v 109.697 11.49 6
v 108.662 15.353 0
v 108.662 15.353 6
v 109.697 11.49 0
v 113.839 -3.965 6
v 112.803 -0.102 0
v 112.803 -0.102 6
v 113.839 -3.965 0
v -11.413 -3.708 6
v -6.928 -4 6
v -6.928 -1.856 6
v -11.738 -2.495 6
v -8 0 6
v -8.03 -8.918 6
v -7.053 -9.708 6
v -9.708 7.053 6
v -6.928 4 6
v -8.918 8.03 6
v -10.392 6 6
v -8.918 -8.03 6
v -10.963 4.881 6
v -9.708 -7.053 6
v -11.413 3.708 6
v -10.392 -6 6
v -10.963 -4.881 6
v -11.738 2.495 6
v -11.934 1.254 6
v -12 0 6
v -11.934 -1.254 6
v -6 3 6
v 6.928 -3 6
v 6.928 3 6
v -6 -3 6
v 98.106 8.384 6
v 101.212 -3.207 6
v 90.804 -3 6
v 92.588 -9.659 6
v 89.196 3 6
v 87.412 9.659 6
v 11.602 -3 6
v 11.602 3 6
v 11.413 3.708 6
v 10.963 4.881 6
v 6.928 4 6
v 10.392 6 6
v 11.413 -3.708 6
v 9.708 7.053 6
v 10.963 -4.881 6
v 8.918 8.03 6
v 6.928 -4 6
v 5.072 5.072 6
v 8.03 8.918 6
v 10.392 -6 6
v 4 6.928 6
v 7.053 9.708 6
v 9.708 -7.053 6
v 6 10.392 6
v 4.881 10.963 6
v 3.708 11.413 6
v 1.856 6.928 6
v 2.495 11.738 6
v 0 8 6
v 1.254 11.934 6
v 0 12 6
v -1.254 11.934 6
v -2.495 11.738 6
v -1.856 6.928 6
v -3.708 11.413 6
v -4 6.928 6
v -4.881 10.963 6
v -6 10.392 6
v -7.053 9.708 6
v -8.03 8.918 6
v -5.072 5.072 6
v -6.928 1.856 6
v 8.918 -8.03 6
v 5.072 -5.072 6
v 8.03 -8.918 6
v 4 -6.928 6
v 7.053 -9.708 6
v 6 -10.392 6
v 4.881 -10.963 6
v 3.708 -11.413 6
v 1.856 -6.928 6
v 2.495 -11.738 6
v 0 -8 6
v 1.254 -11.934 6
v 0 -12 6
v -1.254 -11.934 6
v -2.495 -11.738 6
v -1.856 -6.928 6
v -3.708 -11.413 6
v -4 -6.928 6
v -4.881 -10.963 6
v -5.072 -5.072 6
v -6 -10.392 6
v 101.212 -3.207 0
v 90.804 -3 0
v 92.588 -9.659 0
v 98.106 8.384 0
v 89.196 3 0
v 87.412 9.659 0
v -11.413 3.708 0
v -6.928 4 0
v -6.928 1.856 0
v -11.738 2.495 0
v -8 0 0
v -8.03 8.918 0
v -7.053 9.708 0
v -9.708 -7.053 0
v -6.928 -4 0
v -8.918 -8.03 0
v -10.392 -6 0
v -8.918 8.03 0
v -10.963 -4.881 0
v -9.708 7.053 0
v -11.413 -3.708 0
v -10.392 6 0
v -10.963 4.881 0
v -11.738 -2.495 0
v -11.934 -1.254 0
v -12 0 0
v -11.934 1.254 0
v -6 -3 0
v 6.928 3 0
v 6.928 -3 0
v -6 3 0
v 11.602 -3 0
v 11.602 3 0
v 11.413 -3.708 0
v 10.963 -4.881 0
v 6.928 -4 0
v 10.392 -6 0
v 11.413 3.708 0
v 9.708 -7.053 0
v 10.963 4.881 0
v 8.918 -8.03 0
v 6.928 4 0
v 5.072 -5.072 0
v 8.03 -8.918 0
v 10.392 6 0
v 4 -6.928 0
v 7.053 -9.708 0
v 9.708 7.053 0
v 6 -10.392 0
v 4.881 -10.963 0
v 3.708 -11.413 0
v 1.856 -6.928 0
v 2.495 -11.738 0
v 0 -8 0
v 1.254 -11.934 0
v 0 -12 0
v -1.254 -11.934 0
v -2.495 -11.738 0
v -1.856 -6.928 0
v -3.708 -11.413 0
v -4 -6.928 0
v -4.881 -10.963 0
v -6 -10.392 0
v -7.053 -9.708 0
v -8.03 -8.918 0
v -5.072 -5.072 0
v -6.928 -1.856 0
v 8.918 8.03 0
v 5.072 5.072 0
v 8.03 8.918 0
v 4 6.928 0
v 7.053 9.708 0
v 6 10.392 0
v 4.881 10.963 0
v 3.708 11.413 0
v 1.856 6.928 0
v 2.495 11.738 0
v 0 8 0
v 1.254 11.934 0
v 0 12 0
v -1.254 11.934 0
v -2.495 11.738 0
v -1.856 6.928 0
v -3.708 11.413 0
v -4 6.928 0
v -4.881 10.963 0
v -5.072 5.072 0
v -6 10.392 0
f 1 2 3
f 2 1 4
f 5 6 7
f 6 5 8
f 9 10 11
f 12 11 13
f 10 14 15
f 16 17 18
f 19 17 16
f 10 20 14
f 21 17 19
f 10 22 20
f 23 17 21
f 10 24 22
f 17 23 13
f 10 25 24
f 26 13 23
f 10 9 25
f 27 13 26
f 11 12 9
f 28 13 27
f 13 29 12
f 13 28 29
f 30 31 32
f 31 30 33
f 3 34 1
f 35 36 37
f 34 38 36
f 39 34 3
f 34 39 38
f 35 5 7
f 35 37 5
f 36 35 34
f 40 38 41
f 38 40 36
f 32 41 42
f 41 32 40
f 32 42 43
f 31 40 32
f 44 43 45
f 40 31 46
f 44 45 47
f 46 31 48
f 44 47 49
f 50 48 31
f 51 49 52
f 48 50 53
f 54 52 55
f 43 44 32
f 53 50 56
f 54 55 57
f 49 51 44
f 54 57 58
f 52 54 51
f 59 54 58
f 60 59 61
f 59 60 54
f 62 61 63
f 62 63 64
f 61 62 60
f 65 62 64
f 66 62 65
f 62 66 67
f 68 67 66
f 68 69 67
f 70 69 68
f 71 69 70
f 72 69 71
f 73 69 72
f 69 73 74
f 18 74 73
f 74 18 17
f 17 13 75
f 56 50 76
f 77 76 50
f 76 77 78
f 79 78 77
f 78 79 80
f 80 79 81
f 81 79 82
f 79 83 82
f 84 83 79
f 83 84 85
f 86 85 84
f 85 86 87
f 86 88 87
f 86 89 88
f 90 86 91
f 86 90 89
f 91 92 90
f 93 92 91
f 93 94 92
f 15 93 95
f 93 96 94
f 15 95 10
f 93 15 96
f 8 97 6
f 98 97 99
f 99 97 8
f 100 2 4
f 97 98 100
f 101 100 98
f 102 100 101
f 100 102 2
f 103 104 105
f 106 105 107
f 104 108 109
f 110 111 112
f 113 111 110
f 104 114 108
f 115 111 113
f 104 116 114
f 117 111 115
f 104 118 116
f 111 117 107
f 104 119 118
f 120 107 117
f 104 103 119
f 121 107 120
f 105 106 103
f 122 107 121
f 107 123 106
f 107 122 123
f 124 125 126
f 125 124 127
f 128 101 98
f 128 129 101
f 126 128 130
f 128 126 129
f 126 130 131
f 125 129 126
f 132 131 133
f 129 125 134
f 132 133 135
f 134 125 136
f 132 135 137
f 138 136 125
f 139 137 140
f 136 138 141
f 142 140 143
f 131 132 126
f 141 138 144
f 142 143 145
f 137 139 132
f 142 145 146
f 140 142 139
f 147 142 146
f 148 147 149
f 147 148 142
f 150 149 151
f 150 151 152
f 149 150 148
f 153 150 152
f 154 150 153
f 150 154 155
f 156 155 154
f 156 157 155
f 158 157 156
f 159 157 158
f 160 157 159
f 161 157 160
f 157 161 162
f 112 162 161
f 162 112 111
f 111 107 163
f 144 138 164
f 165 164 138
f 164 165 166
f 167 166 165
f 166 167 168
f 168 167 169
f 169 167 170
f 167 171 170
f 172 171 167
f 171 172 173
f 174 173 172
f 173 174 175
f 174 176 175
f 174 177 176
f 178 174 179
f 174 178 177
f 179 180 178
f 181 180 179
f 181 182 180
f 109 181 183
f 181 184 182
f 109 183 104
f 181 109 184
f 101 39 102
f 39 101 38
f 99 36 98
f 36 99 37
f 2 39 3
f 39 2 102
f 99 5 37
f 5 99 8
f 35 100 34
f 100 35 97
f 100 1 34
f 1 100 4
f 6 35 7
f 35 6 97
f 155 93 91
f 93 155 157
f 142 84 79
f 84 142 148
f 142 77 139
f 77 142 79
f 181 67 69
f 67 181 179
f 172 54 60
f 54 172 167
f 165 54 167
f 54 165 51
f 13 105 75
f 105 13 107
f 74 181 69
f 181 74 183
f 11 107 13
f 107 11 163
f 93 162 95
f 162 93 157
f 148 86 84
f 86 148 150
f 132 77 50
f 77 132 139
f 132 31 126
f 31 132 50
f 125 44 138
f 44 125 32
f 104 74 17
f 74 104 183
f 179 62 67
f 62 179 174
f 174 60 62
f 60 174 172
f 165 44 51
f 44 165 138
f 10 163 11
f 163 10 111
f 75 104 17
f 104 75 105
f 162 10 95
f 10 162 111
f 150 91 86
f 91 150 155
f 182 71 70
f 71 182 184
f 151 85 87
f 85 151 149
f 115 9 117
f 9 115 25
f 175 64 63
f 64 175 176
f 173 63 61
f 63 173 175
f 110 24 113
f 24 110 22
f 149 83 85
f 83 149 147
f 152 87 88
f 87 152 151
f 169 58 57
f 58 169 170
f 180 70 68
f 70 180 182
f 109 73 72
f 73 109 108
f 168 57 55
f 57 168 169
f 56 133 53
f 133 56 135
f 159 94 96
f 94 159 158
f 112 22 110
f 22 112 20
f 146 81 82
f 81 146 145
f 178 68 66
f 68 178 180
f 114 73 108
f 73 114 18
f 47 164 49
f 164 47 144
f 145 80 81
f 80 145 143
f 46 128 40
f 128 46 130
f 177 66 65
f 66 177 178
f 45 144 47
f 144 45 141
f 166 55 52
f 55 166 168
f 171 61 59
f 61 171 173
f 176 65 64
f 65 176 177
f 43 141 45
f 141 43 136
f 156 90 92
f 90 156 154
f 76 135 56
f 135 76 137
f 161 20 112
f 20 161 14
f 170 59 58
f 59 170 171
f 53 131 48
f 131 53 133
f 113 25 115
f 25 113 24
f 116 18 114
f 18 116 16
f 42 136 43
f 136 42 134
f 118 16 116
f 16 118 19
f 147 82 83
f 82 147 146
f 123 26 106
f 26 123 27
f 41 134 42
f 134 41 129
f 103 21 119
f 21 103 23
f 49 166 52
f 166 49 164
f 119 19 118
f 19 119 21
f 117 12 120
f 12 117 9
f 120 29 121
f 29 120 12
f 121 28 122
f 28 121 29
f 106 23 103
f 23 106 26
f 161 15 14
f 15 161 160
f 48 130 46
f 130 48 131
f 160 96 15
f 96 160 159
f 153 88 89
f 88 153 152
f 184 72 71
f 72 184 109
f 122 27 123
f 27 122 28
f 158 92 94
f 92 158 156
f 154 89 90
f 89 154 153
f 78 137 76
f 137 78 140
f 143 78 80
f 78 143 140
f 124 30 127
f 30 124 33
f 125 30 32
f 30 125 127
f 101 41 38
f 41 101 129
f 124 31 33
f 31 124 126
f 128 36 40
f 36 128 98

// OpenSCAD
// file: _common.scad
// mechanism 共用設定 + 齒輪 module
$fn = 60;

// 簡化齒輪：N 個齒、節圓半徑 r、齒高 h、齒寬 w
module simple_gear(N = 16, r = 20, h = 4, thick = 6) {
  union() {
    // 主圓盤
    cylinder(h = thick, r = r, center = true);
    // 齒（梯形）
    for (i = [0:N-1]) {
      rotate([0, 0, i * 360 / N])
        translate([r, 0, 0])
          linear_extrude(height = thick, center = true)
            polygon([[0, -2.4], [h, -1.4], [h, 1.4], [0, 2.4]]);
    }
    // 中心凸軸
    cylinder(h = thick * 1.4, r = r * 0.18, center = true);
  }
}
// main file
// 扳手 Wrench — 開口扳手（鋼製）
include <_common.scad>

// 主桿（細長矩形）
color([0.55, 0.55, 0.58])
  translate([-6, -3, 0]) cube([100, 6, 6]);

// 末端開口頭（U 形）：2026-10 修正：開口頭與柄成 15°（一般開口扳手的偏角）
color([0.55, 0.55, 0.58])
  translate([90, 0, 0]) rotate([0, 0, 15]) translate([0, -10, 0]) {
    difference() {
      // 外輪廓
      cube([22, 20, 6]);
      // 開口槽（U 形，置中、只向 +X 端開口）
      translate([10, 4, -1]) cube([14, 12, 8]);
      // 六角內部模糊（讓開口看起來像 U + 兩側內凹）
    }
  }

// 另一端梅花頭（圓環）：2026-10 修正：內孔改成 12 角（兩個錯開 30° 的六角形聯集），原本是單一六角
color([0.55, 0.55, 0.58])
  translate([0, 0, 3])
    difference() {
      cylinder(h = 6, r = 12, center = true);
      for (a = [0, 30]) rotate([0, 0, a]) cylinder(h = 8, r = 8, center = true, $fn = 6);
    }
